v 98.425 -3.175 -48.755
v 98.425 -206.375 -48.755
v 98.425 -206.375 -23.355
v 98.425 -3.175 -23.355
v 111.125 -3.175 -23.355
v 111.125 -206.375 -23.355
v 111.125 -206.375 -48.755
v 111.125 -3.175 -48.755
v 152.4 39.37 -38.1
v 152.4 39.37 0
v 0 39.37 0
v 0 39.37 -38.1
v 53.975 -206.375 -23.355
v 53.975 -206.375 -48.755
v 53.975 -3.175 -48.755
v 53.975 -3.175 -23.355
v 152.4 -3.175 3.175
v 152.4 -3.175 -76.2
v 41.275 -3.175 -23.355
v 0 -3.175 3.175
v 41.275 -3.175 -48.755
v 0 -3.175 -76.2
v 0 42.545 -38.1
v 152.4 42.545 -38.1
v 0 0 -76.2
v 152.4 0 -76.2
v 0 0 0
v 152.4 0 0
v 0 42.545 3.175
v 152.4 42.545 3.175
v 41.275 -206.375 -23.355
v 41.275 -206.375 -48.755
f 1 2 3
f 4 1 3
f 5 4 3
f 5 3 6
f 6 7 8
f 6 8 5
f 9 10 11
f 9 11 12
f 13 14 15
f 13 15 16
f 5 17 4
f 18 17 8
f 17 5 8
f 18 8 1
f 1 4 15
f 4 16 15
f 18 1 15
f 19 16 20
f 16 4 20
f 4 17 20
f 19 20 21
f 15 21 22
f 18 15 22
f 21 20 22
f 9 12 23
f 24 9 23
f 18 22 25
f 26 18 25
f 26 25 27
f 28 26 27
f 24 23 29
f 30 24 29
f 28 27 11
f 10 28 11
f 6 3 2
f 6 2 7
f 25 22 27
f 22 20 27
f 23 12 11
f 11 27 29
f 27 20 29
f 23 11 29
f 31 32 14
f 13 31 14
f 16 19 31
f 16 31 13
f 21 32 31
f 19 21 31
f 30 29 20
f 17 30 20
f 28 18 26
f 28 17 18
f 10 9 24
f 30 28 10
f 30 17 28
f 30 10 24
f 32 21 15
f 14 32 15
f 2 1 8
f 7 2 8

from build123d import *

# Parameters (mm, degrees)
F1_DEPTH = 152.4
F2_W     = 12.7
F2_H     = 25.4
F3_DEPTH = 203.2


with BuildPart() as f1:
    # F0 (on Right) → F1 (new body)
    with BuildSketch(Plane.YZ):
        Polygon((-3.175, -76.2), (0, -76.2), (0, 0), (39.37, 0), (39.37, -38.1), (42.545, -38.1), (42.545, 3.175), (-3.175, 3.175), align=None)
    extrude(amount=F1_DEPTH)

    # F2 (on face) → F3 (join)
    with BuildSketch(Plane.XZ.offset(3.175)):
        with Locations((47.625, -36.054839)):
            Rectangle(F2_W, F2_H)
        with Locations((104.775, -36.054839)):
            Rectangle(F2_W, F2_H)
    extrude(amount=F3_DEPTH)


solid = f1.part
